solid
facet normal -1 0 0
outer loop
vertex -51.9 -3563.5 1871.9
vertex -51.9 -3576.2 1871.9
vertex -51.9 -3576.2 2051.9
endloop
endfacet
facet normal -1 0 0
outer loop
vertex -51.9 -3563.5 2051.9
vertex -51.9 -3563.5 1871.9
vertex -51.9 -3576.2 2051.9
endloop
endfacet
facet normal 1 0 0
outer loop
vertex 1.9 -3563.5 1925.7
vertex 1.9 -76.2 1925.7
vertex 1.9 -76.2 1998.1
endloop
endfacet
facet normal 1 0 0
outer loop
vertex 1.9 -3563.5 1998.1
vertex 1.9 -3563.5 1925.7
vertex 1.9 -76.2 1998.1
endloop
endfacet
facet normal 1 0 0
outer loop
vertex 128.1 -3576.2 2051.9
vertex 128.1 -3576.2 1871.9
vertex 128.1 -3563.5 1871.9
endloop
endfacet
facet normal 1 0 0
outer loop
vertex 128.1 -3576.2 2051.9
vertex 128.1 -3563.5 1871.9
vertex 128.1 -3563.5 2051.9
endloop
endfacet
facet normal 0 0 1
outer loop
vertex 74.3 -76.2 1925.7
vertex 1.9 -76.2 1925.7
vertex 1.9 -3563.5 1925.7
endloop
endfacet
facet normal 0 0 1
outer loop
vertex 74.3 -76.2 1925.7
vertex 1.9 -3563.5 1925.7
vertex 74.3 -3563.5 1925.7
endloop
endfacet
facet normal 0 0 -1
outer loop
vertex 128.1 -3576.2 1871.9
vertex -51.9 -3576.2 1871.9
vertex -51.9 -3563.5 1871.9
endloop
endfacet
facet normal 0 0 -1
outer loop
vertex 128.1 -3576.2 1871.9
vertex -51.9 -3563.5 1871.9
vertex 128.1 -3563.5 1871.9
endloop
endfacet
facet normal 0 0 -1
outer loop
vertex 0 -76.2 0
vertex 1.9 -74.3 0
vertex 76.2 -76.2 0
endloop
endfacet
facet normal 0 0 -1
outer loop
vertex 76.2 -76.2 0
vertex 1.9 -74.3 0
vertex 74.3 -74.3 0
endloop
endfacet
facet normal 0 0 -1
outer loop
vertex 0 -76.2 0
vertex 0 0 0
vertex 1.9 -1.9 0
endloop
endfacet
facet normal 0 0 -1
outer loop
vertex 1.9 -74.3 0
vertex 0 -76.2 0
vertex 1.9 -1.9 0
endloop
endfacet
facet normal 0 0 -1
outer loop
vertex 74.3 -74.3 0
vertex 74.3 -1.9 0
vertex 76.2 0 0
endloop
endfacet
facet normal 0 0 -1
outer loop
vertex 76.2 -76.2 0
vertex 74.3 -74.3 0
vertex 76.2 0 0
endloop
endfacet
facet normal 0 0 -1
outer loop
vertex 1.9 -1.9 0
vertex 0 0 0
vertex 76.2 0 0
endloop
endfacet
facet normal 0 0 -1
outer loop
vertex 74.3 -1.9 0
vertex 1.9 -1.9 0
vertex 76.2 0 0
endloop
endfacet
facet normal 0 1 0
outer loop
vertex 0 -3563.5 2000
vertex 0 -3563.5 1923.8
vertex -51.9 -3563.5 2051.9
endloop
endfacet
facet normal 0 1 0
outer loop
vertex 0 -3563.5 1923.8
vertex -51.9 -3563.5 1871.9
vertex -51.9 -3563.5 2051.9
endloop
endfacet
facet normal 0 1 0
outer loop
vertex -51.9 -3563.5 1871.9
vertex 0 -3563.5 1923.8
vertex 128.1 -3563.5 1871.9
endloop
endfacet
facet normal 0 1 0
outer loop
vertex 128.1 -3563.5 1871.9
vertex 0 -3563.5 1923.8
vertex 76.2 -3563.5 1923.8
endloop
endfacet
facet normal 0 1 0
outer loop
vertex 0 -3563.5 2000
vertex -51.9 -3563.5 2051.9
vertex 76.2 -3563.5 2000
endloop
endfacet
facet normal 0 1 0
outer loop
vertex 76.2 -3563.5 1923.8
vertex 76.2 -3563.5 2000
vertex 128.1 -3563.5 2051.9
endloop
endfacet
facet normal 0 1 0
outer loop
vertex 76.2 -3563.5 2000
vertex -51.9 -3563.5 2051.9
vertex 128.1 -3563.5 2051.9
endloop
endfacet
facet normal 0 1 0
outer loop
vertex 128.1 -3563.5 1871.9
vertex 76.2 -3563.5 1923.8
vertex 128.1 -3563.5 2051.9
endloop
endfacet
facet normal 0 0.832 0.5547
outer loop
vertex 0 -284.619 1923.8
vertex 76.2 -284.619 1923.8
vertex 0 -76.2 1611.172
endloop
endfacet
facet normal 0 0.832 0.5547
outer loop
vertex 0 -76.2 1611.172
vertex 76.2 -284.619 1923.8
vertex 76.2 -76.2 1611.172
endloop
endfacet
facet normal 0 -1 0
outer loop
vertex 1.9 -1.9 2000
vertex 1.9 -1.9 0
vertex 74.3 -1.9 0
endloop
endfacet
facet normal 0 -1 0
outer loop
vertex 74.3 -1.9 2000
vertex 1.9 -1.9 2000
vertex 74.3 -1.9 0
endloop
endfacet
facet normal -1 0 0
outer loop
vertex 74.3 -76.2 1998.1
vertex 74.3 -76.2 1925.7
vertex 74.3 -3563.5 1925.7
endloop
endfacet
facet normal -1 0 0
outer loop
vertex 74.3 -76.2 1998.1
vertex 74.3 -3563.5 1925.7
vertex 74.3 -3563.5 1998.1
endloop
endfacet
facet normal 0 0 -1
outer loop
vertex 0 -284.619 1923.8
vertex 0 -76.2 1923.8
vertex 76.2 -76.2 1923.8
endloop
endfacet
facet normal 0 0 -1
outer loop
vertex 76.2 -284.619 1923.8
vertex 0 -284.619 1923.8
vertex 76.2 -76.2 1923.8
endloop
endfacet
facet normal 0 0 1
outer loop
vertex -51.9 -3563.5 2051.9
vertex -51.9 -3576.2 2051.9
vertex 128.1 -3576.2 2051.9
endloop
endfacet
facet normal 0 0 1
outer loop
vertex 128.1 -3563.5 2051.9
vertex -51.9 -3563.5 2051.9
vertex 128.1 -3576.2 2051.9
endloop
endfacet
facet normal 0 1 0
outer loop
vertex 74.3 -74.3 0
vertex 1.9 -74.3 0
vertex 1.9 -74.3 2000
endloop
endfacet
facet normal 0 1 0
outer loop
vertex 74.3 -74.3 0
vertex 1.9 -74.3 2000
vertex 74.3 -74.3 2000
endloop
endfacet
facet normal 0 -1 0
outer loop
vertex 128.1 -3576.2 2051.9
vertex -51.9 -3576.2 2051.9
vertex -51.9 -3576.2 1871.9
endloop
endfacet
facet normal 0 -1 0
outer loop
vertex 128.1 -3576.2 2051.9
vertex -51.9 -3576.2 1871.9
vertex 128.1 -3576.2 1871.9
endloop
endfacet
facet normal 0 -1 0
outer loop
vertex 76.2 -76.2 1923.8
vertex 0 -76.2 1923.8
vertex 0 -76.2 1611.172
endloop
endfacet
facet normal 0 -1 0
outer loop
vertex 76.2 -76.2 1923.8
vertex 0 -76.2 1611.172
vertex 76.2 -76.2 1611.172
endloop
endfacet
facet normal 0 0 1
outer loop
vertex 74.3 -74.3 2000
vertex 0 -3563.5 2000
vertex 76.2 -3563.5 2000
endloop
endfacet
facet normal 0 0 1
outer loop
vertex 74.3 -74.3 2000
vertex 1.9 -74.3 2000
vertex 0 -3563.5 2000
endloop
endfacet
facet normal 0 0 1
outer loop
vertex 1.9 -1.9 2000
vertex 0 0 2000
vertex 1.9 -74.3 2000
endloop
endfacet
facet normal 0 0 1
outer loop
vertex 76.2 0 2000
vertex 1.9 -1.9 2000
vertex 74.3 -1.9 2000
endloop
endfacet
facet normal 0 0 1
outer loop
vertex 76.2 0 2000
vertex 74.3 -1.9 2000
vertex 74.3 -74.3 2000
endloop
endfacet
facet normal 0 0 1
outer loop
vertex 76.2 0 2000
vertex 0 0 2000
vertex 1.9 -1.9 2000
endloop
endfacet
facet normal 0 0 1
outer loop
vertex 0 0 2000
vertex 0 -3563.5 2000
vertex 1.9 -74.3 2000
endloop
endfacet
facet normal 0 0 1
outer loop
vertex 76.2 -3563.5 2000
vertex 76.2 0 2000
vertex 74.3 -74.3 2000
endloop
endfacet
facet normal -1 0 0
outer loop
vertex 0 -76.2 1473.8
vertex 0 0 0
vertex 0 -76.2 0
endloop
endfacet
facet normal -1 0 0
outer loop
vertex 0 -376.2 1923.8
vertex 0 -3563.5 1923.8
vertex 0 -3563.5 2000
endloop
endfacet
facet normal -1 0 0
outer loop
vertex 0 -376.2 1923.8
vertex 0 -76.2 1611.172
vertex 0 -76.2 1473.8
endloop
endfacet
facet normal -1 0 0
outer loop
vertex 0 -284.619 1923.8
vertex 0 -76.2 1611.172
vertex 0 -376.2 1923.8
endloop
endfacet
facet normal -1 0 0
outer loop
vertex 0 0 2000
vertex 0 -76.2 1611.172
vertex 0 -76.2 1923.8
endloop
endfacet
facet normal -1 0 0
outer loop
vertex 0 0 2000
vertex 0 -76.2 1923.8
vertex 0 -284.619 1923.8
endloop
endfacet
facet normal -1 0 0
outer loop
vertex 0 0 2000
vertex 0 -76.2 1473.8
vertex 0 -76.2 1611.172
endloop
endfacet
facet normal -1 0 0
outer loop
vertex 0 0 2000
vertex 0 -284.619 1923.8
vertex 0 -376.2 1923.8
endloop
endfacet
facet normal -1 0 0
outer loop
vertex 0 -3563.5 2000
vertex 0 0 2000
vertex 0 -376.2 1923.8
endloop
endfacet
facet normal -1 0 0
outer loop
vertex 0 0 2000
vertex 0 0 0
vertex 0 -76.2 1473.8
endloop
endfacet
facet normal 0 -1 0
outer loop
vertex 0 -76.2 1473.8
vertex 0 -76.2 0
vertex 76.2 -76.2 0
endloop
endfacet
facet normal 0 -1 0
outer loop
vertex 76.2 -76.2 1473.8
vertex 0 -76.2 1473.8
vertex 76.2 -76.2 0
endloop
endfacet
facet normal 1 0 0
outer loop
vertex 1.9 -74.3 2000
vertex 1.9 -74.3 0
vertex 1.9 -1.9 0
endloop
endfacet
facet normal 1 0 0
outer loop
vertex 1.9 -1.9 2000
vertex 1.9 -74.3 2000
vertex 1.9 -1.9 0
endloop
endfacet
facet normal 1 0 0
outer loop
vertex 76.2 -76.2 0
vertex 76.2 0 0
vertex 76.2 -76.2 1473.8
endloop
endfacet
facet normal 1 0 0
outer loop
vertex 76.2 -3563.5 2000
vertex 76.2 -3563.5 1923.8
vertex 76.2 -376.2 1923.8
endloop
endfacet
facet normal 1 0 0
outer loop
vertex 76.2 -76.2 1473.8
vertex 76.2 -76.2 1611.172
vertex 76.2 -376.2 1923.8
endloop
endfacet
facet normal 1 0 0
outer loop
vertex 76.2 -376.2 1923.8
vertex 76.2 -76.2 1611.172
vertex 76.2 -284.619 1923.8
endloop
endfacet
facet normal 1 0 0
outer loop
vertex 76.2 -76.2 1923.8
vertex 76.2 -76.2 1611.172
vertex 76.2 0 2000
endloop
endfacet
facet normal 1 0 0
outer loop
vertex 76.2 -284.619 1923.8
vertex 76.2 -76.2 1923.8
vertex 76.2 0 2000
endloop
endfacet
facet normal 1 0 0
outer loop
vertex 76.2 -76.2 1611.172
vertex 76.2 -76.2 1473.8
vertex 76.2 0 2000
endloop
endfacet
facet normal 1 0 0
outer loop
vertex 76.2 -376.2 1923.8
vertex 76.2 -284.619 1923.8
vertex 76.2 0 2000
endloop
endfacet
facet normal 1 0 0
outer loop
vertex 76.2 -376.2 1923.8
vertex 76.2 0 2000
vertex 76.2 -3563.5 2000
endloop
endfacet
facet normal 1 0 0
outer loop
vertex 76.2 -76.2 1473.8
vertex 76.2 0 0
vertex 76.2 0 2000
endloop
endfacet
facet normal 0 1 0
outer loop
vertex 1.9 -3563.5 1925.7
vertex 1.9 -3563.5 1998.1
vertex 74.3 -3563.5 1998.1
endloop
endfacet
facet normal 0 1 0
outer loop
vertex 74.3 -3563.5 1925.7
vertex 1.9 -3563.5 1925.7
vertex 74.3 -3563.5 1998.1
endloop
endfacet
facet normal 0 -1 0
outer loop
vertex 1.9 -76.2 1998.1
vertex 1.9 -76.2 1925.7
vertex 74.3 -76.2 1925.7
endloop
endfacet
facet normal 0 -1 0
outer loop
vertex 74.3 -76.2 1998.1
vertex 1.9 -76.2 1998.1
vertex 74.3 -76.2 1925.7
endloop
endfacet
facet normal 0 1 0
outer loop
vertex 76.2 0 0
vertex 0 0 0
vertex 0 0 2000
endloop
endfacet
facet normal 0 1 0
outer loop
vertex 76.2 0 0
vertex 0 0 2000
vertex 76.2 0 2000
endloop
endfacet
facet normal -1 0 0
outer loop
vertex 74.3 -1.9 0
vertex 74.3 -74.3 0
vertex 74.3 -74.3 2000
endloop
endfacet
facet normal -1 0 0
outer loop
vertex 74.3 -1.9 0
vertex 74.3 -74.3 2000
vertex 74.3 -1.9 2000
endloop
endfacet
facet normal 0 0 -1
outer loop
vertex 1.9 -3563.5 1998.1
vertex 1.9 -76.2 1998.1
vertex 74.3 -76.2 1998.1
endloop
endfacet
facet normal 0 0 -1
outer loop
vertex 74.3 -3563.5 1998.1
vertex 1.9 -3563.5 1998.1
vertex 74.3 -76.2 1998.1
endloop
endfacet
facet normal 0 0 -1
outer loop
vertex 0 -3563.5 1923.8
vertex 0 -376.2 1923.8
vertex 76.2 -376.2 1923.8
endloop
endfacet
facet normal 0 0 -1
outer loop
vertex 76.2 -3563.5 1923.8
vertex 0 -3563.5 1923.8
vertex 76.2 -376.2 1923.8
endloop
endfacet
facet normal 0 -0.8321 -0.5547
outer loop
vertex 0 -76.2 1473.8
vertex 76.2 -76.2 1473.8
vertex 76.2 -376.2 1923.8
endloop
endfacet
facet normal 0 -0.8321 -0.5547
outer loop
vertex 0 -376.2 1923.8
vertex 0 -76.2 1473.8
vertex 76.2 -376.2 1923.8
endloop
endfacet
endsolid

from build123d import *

# Parameters (mm, degrees)
CROQUIS1_W              = 76.2
CROQUIS1_H              = 76.2
CROQUIS1_W_2            = 72.4
CROQUIS1_H_2            = 72.4
SALIENTE_EXTRUIR1_DEPTH = 2000
CROQUIS2_W              = 76.2
CROQUIS2_H              = 76.2
CROQUIS2_W_2            = 72.4
CROQUIS2_H_2            = 72.4
SALIENTE_EXTRUIR2_DEPTH = 3500
CROQUIS3_W              = 180
CROQUIS3_H              = 180
SALIENTE_EXTRUIR3_DEPTH = 12.7
SALIENTE_EXTRUIR4_DEPTH = 76.2


with BuildPart() as part:
    # Croquis1 → Saliente-Extruir1 (new body)
    with BuildSketch(Plane.XY):
        with Locations((38.1, -38.1)):
            Rectangle(CROQUIS1_W, CROQUIS1_H)
        with Locations((38.1, -38.1)):
            Rectangle(CROQUIS1_W_2, CROQUIS1_H_2, mode=Mode.SUBTRACT)
    extrude(amount=SALIENTE_EXTRUIR1_DEPTH)

    # Croquis2 → Saliente-Extruir2 (add)
    with BuildSketch(Plane.XZ.offset(76.2)):
        with Locations((38.1, 1961.9)):
            Rectangle(CROQUIS2_W, CROQUIS2_H)
        with Locations((38.1, 1961.9)):
            Rectangle(CROQUIS2_W_2, CROQUIS2_H_2, mode=Mode.SUBTRACT)
    extrude(amount=SALIENTE_EXTRUIR2_DEPTH)

    # Croquis3 → Saliente-Extruir3 (add)
    with BuildSketch(Plane.XZ.offset(3576.2)):
        with Locations((38.1, 1961.9)):
            Rectangle(CROQUIS3_W, CROQUIS3_H)
    extrude(amount=-SALIENTE_EXTRUIR3_DEPTH)

    # Croquis4 → Saliente-Extruir4 (add)
    with BuildSketch(Plane(origin=(76.2, 0, 0), x_dir=(0, 0, -1), z_dir=(1, 0, 0))):
        Polygon((-1473.8, -76.2), (-1923.8, -376.2), (-1923.8, -284.618997603), (-1611.171503595, -76.2), align=None)
    extrude(amount=-SALIENTE_EXTRUIR4_DEPTH)


solid = part.part
